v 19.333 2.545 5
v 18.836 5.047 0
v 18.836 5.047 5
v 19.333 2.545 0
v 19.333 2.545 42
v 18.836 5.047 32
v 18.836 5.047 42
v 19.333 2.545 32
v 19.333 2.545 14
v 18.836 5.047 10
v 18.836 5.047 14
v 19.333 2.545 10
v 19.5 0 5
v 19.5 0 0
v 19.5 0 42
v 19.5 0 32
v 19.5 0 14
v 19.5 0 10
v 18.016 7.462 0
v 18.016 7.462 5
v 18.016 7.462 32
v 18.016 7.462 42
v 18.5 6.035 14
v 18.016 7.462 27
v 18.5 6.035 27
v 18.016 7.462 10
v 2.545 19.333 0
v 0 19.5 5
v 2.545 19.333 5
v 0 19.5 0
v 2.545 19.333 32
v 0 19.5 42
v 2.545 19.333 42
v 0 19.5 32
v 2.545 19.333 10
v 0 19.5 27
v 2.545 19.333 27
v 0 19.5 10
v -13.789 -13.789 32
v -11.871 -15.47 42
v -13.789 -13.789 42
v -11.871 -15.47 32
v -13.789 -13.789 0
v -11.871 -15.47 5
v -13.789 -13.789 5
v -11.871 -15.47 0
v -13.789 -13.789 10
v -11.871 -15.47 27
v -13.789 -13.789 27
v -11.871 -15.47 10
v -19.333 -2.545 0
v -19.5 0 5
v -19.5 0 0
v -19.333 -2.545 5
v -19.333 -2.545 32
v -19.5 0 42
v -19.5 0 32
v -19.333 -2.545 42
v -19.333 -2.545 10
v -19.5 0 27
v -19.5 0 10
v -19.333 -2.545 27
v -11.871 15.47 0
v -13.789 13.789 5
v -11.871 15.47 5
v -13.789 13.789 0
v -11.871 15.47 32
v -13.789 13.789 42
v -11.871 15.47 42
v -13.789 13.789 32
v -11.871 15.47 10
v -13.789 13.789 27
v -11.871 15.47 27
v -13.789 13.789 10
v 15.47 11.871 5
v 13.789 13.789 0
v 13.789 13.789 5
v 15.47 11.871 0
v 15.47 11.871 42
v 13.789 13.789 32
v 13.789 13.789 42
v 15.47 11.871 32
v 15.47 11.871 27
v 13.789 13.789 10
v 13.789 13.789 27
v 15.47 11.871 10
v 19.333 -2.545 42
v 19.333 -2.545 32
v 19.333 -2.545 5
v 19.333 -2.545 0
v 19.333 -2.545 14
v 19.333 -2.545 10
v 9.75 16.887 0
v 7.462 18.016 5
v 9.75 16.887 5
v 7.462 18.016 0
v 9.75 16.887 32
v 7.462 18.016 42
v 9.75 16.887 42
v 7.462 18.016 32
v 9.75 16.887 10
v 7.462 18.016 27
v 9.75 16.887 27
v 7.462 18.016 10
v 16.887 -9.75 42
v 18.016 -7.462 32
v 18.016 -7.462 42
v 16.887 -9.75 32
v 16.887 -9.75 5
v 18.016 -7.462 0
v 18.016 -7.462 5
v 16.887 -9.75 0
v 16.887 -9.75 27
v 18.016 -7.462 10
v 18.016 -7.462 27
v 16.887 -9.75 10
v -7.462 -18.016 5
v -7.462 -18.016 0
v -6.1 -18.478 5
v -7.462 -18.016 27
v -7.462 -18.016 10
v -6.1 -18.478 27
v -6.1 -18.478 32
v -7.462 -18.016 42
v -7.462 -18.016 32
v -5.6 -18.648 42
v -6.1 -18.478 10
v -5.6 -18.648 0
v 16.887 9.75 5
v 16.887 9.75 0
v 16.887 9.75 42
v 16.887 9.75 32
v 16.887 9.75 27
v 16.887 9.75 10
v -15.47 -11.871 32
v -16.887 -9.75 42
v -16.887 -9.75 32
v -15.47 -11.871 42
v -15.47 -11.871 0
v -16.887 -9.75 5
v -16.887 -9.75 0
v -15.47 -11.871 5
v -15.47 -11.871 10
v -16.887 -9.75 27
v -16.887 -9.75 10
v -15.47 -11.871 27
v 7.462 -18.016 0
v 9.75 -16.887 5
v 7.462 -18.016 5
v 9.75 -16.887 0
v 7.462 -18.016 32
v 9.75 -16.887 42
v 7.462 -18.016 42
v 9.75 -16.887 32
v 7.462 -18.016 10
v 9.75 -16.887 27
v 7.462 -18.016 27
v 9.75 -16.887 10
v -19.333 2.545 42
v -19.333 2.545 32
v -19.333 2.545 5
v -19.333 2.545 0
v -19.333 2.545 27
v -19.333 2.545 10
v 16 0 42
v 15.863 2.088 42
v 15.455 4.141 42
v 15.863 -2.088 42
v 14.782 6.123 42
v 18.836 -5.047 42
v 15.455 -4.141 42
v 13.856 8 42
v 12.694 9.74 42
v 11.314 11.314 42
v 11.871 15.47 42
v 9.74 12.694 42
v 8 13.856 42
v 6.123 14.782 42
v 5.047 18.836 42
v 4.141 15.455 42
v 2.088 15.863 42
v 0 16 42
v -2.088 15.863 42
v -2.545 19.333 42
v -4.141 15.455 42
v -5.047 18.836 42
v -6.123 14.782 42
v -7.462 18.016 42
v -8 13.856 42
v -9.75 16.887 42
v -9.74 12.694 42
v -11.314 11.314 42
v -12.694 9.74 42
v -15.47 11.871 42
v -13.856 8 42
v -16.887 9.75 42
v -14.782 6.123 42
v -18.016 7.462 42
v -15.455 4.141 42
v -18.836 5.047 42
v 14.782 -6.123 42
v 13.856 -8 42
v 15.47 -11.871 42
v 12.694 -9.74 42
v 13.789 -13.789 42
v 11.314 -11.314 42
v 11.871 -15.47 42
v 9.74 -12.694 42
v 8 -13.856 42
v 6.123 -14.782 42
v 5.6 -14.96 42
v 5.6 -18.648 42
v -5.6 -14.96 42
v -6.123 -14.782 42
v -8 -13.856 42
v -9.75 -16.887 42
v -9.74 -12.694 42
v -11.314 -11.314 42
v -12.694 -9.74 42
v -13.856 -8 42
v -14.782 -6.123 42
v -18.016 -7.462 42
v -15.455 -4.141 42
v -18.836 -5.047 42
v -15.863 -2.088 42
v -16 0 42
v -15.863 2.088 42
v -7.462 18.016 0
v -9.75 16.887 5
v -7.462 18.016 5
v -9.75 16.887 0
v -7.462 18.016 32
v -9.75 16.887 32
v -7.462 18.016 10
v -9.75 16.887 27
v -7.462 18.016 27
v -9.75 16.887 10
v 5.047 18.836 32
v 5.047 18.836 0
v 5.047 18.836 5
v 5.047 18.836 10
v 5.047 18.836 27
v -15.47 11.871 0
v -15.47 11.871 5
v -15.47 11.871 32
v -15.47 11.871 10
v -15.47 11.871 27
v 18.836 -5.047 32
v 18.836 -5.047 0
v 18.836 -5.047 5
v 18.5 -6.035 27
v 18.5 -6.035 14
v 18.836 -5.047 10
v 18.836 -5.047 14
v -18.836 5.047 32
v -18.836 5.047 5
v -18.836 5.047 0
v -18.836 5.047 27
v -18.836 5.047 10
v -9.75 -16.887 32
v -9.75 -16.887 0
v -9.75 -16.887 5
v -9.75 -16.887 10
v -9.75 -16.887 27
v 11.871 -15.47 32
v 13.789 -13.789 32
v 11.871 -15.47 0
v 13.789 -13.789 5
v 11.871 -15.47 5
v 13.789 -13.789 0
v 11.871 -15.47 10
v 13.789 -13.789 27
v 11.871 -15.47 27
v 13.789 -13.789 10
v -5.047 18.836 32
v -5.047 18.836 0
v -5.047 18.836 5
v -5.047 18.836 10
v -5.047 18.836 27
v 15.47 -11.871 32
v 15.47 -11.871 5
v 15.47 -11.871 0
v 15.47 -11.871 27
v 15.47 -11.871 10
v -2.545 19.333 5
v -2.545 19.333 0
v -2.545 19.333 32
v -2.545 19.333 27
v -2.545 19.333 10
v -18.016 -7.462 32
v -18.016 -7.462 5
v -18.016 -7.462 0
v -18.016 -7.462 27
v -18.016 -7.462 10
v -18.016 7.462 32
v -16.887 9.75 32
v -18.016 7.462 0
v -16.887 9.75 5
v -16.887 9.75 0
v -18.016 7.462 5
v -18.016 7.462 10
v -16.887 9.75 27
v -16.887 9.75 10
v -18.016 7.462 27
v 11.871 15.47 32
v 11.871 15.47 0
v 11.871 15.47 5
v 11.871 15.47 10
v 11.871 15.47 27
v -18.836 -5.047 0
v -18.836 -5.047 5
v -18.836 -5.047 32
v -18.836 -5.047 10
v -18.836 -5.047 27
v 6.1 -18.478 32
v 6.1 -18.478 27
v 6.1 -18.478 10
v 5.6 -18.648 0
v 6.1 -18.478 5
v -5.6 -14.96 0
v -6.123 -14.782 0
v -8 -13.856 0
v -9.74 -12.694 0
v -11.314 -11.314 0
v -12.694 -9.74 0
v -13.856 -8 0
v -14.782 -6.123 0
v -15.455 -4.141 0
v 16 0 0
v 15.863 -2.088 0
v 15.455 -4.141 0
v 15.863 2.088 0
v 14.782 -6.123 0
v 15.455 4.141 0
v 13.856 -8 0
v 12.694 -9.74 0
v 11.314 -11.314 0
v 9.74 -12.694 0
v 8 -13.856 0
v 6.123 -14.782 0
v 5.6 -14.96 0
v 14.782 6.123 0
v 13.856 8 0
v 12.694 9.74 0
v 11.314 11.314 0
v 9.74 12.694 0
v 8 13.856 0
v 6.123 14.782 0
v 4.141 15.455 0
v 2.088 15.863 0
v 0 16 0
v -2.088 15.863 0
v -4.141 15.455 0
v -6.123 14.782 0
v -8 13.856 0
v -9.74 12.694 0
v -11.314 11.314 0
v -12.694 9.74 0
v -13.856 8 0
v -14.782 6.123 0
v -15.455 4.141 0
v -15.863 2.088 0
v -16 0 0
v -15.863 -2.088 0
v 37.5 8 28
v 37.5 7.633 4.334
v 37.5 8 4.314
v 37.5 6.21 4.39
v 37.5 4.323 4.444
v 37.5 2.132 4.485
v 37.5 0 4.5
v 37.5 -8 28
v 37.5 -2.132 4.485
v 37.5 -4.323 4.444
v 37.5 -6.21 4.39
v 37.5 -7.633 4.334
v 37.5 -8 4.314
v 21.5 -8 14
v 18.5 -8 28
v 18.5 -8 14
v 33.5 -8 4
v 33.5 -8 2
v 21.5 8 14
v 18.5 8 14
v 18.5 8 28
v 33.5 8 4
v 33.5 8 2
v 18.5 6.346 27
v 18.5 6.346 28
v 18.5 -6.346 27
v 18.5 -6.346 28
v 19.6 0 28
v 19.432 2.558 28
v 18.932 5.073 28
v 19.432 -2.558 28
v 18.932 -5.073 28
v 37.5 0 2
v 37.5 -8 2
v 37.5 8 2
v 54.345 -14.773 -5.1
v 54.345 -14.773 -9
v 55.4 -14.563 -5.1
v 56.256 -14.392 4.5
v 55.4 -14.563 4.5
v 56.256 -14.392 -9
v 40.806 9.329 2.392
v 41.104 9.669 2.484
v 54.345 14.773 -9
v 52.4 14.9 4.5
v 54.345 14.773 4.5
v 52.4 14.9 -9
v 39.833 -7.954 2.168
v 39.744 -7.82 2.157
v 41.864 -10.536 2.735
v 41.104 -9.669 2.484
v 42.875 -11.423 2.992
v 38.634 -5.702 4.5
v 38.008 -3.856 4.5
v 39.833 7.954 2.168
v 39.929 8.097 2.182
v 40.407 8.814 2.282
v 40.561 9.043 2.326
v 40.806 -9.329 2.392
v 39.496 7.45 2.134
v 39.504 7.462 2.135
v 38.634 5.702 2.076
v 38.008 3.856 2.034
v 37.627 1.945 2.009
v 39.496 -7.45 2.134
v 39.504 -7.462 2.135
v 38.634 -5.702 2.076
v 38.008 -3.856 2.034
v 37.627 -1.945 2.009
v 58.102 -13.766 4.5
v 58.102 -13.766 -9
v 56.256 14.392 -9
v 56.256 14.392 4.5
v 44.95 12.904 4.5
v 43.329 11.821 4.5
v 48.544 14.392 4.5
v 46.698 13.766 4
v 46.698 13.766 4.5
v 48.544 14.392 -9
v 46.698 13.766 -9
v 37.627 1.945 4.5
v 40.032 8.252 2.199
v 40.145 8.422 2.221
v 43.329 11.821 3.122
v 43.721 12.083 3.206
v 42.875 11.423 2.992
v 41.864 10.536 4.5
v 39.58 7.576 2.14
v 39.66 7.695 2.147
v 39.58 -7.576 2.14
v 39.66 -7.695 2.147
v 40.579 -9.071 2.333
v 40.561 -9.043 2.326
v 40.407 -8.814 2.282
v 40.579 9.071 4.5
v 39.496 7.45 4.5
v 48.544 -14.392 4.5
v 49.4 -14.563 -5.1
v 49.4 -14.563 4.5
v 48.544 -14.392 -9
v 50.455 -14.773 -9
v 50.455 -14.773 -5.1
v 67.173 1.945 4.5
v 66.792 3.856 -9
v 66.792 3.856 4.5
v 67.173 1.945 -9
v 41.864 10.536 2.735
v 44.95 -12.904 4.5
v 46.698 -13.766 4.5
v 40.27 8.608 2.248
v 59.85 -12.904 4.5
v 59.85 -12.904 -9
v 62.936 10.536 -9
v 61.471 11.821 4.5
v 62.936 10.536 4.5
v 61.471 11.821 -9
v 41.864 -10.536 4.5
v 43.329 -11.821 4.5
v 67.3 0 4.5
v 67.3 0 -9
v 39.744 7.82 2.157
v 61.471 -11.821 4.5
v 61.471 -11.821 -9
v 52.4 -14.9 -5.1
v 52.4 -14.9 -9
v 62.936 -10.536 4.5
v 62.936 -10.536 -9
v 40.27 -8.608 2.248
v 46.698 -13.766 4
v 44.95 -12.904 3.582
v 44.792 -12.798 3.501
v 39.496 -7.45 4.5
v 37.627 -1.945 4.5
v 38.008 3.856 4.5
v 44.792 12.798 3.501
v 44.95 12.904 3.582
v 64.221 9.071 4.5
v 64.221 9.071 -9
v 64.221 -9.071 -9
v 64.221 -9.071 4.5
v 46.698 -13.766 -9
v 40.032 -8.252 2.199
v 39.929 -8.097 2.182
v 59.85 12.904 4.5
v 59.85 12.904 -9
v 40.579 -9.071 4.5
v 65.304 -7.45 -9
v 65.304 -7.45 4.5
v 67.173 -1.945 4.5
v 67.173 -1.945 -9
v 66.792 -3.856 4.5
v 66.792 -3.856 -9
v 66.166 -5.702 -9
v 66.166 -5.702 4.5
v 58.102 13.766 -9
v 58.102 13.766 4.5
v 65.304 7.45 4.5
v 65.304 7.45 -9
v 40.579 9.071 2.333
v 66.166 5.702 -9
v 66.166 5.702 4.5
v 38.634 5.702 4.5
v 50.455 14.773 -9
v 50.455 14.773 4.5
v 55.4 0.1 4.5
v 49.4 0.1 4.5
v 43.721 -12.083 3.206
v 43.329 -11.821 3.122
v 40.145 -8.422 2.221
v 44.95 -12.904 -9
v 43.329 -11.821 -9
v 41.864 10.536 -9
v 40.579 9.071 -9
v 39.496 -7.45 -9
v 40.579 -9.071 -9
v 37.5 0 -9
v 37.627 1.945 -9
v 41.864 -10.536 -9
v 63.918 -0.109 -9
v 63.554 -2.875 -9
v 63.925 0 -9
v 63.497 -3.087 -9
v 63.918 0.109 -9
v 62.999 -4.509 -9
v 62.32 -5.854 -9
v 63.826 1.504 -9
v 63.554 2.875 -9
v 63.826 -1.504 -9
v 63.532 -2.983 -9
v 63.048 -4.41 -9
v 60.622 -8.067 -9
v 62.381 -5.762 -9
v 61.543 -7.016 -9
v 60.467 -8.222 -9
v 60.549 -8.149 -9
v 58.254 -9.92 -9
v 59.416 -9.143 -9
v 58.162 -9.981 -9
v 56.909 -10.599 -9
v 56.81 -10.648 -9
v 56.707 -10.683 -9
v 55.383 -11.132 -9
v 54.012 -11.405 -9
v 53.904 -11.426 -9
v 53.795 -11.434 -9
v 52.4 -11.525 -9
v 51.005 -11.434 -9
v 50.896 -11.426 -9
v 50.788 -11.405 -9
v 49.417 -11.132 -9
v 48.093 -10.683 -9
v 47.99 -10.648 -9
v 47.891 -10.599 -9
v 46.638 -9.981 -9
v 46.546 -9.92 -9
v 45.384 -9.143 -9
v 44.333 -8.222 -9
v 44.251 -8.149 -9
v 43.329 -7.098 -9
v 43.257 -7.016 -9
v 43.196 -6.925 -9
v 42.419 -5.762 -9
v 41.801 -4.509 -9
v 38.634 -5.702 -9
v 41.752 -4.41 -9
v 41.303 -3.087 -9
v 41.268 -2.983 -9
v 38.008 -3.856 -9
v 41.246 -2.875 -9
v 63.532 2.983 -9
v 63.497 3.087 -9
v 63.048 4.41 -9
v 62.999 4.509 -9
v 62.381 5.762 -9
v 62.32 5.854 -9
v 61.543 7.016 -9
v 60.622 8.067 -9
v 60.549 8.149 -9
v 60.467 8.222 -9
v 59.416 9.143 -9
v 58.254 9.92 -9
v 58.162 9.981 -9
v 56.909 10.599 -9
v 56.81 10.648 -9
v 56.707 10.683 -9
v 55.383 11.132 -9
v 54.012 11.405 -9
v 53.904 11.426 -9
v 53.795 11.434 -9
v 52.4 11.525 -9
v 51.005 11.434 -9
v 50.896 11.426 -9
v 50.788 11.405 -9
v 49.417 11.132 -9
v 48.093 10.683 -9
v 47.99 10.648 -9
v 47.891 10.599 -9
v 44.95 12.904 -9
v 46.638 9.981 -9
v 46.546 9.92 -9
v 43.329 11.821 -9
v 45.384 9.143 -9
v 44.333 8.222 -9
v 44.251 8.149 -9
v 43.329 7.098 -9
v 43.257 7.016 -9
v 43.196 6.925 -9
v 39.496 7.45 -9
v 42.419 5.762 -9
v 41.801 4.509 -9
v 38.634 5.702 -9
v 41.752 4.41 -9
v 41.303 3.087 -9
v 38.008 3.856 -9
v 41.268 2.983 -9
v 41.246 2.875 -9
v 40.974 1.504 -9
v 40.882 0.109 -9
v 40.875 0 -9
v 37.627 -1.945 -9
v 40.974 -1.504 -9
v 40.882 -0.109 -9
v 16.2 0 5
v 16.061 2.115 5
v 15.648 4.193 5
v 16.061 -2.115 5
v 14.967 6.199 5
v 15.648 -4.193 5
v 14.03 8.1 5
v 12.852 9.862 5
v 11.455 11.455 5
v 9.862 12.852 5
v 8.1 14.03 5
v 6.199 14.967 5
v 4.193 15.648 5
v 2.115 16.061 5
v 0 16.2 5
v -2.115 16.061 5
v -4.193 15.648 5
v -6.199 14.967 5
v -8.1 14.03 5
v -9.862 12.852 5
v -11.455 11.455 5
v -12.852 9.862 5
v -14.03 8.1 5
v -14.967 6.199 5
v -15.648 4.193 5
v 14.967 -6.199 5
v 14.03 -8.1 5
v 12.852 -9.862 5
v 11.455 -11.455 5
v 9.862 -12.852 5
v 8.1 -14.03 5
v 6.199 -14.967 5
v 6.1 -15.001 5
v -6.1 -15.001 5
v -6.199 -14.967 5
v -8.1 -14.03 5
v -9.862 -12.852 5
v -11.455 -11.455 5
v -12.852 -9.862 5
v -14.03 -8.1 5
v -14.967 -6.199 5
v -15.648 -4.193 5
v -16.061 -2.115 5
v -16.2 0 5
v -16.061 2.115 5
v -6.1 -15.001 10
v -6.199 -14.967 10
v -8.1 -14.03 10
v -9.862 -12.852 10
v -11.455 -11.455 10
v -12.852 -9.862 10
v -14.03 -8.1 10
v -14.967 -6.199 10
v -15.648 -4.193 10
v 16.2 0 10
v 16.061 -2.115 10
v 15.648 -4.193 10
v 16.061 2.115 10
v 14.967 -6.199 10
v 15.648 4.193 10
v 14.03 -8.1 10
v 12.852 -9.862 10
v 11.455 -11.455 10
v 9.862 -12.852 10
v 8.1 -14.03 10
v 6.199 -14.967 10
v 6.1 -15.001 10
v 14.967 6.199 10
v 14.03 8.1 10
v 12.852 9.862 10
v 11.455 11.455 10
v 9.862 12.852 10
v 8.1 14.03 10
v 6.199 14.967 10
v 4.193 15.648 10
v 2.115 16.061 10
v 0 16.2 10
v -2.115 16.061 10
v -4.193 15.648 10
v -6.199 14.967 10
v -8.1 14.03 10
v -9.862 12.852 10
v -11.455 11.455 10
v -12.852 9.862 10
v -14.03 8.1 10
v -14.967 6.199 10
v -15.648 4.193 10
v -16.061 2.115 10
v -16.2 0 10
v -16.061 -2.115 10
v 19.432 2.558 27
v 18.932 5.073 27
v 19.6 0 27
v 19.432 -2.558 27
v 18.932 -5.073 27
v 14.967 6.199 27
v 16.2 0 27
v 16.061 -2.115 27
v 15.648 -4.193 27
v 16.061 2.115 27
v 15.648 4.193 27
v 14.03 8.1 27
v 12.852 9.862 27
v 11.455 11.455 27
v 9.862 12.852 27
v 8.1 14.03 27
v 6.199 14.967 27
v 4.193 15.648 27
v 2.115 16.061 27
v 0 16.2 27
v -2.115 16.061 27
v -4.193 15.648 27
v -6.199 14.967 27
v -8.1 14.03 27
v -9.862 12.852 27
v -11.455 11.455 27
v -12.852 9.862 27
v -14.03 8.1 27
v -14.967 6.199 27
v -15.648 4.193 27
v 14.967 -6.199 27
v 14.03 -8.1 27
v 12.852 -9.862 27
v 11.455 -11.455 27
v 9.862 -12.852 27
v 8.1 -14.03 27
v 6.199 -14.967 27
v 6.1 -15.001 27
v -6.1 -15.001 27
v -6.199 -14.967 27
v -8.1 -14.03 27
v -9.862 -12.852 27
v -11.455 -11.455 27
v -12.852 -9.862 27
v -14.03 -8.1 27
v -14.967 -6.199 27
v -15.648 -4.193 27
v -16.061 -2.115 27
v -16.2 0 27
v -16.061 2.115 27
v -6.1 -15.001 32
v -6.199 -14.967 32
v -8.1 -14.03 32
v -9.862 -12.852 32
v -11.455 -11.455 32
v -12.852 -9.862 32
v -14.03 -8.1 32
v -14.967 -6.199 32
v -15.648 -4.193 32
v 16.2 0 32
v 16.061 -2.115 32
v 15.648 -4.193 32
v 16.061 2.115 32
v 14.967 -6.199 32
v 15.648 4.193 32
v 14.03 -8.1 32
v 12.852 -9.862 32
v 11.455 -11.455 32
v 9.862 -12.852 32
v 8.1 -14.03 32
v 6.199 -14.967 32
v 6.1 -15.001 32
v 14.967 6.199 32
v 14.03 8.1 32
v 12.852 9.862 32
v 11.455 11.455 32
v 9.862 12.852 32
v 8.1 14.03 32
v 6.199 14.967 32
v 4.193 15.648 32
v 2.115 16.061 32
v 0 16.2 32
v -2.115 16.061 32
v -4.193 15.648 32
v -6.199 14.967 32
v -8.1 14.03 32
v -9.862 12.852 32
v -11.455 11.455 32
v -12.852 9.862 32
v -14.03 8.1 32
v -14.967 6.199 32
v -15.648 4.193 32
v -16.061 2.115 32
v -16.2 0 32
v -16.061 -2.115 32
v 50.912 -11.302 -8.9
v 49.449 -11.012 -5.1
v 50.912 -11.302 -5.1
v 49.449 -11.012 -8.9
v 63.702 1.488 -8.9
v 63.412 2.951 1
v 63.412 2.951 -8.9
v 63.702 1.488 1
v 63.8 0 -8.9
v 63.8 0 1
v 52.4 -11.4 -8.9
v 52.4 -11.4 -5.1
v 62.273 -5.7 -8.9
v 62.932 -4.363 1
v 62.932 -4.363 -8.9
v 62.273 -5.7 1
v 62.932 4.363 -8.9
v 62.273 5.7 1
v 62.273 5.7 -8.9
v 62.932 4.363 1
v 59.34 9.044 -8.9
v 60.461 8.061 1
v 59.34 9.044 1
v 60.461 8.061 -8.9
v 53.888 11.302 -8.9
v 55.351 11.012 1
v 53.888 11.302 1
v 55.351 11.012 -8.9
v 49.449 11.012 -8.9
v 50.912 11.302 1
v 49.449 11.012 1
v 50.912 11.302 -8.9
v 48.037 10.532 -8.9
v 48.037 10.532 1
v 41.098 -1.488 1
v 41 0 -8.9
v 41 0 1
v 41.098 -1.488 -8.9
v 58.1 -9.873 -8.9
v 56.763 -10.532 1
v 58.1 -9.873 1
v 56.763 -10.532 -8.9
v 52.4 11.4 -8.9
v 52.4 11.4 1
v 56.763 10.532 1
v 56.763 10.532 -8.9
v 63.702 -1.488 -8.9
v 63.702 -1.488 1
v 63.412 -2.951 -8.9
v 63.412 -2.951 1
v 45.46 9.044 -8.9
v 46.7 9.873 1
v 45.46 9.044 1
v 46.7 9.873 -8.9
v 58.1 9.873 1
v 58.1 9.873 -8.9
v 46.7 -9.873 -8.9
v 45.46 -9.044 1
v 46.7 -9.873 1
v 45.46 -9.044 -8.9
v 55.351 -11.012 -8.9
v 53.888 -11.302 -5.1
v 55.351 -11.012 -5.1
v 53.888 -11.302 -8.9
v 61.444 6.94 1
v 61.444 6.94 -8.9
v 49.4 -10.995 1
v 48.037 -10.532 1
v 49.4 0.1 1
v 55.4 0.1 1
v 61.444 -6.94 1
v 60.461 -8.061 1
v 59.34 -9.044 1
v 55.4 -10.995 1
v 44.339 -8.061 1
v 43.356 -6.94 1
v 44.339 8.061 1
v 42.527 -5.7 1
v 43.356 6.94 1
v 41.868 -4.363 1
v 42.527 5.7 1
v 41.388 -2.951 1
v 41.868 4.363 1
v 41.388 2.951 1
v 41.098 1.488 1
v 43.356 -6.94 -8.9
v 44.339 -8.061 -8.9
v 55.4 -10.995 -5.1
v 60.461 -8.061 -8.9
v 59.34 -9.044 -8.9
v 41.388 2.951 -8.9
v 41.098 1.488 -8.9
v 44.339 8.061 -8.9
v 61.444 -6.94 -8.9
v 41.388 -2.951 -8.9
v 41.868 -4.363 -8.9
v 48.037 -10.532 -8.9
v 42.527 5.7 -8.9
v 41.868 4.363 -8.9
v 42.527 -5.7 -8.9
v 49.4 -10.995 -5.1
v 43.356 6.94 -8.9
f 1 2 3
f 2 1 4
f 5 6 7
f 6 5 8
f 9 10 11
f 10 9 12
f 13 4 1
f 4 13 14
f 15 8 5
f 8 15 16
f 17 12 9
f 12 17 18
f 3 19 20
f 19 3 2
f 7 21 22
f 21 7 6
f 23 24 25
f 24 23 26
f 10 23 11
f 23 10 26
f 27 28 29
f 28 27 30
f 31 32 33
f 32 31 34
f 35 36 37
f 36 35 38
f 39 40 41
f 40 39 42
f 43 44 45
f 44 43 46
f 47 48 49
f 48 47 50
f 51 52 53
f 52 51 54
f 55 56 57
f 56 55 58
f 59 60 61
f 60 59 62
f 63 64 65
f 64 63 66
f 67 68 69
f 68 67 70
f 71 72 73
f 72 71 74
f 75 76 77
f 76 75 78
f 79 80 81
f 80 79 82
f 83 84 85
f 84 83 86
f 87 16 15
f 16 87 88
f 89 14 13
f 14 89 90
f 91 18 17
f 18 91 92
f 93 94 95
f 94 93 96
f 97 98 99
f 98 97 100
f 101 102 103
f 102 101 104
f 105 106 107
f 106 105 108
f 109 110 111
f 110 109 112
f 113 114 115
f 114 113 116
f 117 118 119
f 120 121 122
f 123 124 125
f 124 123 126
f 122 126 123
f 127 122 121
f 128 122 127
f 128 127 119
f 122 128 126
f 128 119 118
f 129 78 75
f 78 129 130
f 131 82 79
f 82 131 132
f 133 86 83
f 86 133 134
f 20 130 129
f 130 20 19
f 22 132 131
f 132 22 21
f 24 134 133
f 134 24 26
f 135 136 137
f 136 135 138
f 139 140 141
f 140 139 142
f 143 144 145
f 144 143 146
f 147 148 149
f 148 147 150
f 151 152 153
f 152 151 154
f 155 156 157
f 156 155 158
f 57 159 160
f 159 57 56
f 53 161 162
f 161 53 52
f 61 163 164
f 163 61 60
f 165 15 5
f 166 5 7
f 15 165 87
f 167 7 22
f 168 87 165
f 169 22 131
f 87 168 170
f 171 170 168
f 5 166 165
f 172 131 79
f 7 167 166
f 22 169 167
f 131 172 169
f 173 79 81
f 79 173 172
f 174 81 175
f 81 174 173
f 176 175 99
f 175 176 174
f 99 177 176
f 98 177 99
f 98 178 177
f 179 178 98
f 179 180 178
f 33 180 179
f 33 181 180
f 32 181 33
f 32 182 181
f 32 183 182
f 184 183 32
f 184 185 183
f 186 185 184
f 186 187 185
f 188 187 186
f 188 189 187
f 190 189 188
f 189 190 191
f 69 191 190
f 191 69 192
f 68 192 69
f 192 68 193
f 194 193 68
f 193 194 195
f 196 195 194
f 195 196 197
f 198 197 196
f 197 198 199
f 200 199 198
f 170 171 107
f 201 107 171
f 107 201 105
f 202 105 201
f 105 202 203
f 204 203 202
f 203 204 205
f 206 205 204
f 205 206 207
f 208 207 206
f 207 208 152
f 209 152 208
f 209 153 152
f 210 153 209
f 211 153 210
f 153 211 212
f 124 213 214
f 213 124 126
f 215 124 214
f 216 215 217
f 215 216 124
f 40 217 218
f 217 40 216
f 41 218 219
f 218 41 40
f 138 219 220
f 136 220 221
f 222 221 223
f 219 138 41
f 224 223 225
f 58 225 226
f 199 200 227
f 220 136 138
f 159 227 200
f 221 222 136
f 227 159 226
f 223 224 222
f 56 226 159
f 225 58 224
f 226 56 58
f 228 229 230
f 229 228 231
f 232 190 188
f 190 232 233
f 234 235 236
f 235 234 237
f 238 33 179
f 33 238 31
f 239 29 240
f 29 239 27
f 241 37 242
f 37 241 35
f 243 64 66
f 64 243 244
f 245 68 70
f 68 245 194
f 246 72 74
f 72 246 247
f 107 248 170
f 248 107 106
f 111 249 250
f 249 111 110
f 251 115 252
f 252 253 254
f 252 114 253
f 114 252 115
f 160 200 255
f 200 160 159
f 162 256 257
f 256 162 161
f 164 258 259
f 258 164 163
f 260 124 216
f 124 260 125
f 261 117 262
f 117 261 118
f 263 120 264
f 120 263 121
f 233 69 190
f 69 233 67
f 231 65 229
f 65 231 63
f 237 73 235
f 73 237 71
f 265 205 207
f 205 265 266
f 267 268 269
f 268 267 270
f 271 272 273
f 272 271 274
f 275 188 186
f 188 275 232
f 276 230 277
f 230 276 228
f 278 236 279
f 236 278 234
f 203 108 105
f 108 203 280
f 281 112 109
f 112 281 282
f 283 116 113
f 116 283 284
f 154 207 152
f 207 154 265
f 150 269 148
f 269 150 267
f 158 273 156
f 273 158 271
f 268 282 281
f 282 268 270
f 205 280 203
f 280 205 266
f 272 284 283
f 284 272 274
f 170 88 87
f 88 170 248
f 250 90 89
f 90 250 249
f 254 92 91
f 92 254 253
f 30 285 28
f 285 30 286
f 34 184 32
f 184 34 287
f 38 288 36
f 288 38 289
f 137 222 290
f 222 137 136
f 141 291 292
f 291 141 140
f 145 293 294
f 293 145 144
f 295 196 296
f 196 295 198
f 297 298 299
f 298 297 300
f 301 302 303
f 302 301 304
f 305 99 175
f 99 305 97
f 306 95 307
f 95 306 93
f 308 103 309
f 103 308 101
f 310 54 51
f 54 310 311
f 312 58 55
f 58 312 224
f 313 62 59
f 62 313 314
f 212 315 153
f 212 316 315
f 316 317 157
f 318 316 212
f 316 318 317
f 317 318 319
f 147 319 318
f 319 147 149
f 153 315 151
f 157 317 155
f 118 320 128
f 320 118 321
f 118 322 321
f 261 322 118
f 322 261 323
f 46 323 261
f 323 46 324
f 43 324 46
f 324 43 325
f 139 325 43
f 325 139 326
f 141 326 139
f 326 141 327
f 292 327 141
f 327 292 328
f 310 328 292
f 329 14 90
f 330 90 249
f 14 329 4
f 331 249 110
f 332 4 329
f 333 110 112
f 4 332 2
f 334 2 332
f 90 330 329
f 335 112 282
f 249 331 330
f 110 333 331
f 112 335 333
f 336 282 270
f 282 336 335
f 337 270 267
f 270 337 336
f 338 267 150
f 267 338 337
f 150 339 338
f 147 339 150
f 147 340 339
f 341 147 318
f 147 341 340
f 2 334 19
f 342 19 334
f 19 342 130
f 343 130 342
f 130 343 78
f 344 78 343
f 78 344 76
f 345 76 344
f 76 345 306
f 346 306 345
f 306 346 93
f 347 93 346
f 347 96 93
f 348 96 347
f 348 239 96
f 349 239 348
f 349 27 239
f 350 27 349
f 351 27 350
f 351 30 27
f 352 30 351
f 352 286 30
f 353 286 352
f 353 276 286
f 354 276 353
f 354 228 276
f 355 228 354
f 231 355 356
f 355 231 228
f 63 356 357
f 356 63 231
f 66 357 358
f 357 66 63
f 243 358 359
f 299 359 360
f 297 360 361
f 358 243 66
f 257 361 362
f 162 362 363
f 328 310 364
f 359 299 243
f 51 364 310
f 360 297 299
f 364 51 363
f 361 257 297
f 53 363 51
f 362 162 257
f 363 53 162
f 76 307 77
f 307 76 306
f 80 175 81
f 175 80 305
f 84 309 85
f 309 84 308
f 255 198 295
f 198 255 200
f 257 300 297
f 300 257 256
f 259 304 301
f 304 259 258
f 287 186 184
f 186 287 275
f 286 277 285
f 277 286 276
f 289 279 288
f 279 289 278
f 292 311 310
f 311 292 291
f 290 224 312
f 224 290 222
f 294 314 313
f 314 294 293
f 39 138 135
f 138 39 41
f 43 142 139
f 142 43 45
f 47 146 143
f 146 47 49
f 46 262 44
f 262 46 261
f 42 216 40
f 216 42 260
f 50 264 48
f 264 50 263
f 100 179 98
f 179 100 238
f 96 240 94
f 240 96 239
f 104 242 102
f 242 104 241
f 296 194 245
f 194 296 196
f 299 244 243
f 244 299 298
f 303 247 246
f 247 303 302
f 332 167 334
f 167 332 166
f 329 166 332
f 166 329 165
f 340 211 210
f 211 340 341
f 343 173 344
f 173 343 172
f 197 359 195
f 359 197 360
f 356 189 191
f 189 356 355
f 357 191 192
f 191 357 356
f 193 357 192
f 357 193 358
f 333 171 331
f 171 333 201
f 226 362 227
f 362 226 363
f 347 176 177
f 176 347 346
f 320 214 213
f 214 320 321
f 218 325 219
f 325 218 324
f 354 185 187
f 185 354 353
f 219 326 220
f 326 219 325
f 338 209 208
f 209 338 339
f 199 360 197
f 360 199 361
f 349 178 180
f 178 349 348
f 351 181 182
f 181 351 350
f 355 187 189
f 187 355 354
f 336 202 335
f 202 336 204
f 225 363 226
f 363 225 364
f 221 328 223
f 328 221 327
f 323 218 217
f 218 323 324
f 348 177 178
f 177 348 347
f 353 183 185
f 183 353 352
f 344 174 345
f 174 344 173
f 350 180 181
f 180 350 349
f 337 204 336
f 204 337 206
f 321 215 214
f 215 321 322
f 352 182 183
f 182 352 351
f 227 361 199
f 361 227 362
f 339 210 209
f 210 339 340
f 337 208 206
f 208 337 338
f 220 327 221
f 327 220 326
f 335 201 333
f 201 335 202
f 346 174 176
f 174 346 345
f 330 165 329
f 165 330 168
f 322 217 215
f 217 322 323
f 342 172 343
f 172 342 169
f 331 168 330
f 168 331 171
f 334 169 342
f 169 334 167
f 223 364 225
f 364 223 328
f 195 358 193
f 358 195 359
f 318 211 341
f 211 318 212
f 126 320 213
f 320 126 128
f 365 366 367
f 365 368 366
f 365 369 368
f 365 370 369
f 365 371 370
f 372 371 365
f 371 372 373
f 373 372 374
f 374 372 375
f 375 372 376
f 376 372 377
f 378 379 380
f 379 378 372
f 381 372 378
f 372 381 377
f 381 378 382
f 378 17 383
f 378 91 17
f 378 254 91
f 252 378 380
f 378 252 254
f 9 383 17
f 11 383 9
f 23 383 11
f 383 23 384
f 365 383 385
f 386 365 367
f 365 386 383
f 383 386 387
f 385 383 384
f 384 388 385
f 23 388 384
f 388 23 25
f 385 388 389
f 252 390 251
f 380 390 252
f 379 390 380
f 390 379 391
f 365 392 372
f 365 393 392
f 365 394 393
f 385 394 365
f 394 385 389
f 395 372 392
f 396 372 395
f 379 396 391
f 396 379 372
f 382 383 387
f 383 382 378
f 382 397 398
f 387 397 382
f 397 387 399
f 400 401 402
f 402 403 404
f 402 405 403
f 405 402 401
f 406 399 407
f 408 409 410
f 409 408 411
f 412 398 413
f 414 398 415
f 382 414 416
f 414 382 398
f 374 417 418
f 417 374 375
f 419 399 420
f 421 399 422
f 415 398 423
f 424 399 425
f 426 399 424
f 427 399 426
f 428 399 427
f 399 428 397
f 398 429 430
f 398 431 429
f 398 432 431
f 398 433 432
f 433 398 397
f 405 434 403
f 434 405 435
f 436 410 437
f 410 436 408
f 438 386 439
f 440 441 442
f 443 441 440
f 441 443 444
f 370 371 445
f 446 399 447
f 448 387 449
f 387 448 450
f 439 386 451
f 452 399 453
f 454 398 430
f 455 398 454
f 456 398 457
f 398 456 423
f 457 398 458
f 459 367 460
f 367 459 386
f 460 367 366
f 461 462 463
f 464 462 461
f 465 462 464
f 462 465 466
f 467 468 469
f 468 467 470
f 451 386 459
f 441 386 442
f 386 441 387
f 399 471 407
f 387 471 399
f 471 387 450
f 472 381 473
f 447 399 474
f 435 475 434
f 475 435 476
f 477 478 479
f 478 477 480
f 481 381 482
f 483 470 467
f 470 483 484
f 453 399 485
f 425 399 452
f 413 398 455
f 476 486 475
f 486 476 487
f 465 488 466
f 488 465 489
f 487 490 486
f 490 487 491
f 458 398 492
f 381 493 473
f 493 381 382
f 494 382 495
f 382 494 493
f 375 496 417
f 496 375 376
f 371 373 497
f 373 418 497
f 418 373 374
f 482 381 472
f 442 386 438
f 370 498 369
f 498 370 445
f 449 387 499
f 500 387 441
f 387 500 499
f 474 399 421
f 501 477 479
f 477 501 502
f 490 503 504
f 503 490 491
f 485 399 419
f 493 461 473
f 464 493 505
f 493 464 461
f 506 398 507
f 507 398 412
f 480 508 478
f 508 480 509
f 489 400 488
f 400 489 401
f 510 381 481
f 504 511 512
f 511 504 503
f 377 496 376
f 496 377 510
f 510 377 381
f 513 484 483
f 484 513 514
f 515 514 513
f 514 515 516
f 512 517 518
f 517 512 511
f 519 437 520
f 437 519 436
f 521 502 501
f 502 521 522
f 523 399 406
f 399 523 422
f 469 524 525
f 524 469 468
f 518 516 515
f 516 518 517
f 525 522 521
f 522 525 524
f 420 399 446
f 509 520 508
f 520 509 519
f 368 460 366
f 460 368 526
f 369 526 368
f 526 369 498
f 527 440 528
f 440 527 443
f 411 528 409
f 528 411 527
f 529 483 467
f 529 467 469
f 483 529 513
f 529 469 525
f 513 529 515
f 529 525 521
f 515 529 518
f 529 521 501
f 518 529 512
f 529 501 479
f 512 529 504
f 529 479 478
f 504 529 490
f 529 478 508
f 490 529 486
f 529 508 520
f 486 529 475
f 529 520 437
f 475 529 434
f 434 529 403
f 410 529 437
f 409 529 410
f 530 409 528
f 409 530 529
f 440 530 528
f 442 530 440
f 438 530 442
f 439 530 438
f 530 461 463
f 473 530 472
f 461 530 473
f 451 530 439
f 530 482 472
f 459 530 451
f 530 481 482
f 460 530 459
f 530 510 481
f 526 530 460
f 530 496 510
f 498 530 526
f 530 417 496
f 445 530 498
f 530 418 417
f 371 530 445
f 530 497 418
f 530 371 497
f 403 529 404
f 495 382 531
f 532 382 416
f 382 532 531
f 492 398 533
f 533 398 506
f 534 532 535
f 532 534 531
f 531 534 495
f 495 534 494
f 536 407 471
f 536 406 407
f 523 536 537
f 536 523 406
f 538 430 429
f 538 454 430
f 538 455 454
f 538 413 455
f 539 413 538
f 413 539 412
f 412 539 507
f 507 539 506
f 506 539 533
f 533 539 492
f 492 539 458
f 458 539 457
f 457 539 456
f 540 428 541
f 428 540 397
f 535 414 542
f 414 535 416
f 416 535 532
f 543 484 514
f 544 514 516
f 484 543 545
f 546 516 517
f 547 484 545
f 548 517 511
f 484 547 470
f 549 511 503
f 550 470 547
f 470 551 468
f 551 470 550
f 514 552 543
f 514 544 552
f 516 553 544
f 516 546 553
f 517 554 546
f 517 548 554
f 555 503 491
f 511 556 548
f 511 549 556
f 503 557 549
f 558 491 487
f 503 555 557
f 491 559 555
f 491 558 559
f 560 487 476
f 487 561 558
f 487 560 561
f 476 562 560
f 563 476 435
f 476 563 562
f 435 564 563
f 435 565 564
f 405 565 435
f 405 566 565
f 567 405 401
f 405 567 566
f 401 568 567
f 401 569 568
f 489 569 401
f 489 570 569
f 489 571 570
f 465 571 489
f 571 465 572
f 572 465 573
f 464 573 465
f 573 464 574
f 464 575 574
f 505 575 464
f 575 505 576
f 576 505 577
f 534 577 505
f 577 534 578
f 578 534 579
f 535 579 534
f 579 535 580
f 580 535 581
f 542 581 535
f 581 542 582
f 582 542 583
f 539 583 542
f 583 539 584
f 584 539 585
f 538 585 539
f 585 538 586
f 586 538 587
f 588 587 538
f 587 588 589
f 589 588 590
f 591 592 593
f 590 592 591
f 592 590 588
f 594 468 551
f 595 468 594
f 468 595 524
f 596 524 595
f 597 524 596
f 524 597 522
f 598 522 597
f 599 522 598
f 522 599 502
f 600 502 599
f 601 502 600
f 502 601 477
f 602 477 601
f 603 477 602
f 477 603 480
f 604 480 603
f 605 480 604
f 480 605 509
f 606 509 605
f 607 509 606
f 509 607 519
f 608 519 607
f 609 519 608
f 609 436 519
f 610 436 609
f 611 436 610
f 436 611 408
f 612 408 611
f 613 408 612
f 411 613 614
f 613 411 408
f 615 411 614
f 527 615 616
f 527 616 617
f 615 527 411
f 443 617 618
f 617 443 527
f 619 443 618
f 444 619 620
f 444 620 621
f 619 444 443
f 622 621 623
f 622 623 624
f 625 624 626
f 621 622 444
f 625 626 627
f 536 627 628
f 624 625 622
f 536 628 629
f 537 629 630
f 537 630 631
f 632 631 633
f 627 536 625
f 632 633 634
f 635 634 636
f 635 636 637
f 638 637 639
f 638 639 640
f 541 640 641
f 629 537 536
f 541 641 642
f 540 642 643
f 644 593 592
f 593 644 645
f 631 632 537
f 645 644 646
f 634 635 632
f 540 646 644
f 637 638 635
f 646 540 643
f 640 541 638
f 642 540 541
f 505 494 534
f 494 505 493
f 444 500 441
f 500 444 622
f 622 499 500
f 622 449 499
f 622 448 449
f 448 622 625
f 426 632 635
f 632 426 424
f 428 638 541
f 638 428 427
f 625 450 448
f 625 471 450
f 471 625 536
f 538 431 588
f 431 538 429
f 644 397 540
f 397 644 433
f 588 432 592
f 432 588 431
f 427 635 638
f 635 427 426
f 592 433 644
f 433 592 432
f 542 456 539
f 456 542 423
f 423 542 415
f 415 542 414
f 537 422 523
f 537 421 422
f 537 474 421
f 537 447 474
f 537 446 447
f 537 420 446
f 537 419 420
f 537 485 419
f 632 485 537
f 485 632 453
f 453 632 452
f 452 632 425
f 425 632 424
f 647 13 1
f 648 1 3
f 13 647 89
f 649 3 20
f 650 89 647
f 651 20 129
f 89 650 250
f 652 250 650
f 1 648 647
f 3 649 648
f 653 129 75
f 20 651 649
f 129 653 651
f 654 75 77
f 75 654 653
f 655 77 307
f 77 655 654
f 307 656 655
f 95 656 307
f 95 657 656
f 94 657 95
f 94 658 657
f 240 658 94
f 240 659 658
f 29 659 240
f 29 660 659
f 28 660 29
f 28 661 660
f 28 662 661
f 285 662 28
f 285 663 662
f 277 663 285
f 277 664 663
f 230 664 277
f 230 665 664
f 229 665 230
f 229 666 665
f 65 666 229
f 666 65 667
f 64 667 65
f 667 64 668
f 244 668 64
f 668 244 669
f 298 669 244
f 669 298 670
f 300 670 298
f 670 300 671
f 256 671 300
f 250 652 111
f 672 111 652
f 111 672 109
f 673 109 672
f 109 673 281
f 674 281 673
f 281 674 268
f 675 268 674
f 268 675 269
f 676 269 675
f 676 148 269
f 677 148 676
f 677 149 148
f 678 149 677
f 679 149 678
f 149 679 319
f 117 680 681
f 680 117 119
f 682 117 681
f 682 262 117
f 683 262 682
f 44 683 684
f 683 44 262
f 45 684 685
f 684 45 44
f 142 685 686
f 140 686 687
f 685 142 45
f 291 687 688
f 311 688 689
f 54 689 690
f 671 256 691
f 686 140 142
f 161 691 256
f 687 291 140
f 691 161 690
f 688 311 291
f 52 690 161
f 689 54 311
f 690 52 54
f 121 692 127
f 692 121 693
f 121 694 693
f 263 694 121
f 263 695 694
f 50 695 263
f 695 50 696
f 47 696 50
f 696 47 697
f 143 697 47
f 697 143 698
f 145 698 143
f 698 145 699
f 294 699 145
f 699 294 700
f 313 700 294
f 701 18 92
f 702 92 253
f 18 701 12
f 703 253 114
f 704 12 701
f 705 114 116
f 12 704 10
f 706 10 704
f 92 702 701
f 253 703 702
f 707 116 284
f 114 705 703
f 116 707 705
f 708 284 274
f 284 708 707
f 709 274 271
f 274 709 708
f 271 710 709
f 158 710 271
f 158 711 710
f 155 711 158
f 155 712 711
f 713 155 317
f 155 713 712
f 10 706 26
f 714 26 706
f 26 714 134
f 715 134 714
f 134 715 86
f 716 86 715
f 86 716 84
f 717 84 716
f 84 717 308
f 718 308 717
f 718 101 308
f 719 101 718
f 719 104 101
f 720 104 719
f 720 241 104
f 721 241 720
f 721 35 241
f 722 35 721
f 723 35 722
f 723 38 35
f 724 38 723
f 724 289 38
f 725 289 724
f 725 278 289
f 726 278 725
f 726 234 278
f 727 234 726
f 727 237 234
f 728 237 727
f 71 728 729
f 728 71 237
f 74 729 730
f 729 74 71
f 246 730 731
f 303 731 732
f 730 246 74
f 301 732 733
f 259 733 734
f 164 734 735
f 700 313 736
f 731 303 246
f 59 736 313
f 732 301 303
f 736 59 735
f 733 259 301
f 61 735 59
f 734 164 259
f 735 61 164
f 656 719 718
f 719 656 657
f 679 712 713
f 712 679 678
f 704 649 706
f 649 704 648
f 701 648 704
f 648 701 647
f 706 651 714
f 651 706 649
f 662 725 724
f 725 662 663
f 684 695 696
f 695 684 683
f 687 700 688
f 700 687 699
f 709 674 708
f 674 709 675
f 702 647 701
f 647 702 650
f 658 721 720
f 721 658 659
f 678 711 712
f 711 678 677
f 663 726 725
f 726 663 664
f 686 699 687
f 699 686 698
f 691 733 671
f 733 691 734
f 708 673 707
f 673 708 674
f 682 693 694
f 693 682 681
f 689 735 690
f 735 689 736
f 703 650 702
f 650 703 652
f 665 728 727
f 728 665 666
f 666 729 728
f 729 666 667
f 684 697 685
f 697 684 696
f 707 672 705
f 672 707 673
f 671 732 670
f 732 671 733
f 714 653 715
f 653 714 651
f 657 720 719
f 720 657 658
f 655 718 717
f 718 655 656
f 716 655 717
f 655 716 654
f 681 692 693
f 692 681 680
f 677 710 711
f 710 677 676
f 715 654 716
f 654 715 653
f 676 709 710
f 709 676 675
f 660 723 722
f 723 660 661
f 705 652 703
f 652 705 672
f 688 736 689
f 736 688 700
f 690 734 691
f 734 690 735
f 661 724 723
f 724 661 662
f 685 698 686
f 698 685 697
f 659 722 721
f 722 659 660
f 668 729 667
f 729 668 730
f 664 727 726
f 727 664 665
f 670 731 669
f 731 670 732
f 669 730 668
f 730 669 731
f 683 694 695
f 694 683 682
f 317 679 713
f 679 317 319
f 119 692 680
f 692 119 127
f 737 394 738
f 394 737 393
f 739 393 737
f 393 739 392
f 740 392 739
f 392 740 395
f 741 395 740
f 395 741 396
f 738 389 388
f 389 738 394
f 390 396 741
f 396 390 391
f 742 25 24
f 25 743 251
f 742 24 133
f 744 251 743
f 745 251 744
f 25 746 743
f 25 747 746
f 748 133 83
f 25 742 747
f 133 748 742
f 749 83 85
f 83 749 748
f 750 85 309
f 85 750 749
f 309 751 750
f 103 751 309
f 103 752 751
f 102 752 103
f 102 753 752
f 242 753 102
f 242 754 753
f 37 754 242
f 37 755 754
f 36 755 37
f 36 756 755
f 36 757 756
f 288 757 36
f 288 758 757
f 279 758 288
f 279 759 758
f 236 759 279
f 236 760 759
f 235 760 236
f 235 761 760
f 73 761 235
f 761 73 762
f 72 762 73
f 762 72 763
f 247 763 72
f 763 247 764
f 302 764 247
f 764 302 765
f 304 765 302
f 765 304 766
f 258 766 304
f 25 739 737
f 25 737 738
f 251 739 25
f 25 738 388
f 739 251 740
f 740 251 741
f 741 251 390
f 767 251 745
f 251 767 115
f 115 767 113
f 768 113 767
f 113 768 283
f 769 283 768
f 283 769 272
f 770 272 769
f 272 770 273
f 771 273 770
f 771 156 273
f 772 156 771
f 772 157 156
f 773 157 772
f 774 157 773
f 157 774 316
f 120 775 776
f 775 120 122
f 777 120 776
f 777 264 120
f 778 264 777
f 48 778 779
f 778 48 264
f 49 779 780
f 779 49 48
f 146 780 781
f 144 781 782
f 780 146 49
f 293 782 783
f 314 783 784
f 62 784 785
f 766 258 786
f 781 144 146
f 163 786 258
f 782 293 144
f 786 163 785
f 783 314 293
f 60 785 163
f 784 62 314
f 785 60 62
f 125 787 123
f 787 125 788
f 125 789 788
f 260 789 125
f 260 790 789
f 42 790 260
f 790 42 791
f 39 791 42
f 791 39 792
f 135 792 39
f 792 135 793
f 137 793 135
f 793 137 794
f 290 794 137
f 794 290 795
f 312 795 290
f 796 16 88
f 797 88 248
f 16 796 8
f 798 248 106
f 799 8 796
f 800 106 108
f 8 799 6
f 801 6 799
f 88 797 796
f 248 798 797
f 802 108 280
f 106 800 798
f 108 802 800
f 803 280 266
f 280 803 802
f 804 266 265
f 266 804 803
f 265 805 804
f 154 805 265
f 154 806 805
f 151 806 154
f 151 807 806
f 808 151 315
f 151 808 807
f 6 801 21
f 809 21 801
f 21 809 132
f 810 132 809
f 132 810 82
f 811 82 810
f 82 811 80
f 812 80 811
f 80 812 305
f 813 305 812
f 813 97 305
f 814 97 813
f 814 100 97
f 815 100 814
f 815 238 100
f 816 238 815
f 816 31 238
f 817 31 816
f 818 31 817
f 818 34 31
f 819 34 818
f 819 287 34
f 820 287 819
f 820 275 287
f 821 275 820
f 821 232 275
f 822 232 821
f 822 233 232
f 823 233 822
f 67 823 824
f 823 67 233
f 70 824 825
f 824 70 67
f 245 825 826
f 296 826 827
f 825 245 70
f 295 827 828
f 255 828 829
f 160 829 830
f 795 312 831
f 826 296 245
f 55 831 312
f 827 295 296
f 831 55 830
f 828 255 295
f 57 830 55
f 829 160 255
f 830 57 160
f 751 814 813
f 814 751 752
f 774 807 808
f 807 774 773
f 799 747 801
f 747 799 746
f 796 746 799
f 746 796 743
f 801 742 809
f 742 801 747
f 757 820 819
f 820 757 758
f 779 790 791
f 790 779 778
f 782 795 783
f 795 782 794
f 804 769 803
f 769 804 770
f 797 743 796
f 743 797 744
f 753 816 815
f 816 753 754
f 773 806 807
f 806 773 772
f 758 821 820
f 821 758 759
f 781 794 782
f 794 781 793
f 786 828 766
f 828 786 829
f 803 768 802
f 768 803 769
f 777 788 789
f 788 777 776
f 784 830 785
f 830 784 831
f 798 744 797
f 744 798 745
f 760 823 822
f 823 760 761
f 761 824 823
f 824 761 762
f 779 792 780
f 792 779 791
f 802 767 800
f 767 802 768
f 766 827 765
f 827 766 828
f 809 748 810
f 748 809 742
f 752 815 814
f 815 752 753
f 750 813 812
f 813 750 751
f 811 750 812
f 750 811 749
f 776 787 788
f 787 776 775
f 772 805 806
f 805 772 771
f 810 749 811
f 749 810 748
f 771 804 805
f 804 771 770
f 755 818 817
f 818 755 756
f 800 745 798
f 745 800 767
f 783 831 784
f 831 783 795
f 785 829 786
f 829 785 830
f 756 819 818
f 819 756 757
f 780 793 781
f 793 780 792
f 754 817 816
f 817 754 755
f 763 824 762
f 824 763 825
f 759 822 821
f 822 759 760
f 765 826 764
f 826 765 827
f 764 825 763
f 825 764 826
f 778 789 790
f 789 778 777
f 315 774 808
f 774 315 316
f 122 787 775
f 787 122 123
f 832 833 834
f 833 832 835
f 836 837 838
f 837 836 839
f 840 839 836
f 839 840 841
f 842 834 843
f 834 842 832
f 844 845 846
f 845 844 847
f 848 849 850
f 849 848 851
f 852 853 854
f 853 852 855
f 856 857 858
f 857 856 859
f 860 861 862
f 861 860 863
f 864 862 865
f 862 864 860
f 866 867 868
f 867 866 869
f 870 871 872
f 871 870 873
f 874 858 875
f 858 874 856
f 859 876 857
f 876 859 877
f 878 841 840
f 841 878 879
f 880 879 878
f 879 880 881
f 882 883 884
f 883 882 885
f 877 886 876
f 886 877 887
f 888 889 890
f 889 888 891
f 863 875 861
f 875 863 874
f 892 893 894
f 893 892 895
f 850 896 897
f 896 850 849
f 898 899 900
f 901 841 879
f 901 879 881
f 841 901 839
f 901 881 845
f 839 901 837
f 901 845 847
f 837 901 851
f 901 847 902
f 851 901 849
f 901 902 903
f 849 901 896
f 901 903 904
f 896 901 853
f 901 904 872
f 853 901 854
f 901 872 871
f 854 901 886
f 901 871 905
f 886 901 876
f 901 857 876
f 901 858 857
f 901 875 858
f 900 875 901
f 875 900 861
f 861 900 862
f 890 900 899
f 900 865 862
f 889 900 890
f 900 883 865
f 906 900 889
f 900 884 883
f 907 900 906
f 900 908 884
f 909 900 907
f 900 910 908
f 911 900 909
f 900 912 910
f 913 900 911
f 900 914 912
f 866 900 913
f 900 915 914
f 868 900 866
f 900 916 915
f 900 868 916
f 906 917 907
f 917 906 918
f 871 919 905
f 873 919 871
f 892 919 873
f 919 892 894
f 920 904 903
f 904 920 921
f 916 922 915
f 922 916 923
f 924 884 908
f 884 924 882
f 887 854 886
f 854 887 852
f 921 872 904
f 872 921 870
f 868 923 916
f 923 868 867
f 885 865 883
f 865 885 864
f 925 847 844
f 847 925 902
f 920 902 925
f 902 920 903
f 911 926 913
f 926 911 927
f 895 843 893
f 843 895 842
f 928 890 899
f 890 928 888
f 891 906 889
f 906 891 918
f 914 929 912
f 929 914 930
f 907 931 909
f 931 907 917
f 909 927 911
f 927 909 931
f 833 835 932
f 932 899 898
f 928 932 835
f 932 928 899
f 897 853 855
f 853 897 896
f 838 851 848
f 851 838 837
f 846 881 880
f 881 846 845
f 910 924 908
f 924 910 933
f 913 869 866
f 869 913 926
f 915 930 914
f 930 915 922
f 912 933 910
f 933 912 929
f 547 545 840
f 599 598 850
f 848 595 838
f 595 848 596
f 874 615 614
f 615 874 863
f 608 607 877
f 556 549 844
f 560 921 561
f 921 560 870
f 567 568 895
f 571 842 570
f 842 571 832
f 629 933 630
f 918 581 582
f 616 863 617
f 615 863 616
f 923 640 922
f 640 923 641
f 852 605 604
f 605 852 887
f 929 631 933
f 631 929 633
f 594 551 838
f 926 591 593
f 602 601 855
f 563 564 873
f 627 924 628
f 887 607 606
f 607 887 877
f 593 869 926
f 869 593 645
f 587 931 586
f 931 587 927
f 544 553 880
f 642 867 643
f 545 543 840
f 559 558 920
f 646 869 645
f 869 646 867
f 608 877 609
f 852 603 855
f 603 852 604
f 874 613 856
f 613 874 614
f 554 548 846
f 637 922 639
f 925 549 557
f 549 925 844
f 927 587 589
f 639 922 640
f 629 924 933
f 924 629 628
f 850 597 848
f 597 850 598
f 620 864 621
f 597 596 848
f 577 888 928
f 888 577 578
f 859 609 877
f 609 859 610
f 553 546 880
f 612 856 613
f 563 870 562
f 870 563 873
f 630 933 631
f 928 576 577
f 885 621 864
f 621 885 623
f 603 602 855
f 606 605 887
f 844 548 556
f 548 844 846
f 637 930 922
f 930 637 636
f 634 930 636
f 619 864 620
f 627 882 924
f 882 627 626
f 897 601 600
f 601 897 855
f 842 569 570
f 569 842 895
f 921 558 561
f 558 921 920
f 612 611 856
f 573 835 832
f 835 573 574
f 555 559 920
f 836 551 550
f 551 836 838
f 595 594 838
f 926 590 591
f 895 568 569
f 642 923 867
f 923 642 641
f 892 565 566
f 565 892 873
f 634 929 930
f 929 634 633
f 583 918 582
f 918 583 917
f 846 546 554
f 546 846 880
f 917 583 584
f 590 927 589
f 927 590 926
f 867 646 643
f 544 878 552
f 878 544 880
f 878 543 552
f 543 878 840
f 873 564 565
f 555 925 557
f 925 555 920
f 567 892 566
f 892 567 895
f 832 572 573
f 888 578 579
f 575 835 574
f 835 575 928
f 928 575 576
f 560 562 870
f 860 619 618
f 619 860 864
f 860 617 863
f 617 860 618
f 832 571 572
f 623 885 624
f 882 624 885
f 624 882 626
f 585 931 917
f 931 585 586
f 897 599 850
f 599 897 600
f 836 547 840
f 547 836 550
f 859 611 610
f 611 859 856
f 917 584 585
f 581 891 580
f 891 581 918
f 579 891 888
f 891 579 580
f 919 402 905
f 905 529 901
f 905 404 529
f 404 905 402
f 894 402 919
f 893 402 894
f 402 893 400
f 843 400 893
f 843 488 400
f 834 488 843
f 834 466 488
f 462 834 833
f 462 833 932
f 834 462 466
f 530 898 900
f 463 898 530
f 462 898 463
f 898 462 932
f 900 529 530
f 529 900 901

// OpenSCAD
// ╔══════════════════════════════════════════════════════════╗
// ║  JSN-SR04T Sensorhalterung                              ║
// ║  Vertikales Rohr DN25 · Sensor zeigt nach unten        ║
// ║  Tobias Meier · admin@secutobs.com · v0.2.0            ║
// ╠══════════════════════════════════════════════════════════╣
// ║  DRUCKEN:                                              ║
// ║  1. F6 → rendern  2. File → Export → STL              ║
// ║  Material:  PETG oder PLA                              ║
// ║  Schichthöhe: 0.2mm | Wandlinien: 4 | Infill: 40%    ║
// ║  Support: JA – von Bett                                ║
// ║  Ausrichtung: Klammer steht senkrecht auf dem Bett     ║
// ╚══════════════════════════════════════════════════════════╝

// ── Rohr-Durchmesser anpassen ────────────────────────────
ROHR_D = 32;   // DN25 = 32mm Außendurchmesser
               // DN20 = 25mm | DN32 = 40mm | DN40 = 50mm

// ── Sensor JSN-SR04T ─────────────────────────────────────
SENS_D  = 22.0;   // Sensorkopf Außendurchmesser
SENS_SP =  0.4;   // Pressfit-Spiel
SENS_T  = 13.0;   // Einbautiefe

// ── Kabelbinder ──────────────────────────────────────────
KB_B    =  5.0;   // Breite Kabelbinder-Schlitz
KB_ABST = 22.0;   // Abstand der zwei Schlitze
WAND_C  =  3.5;   // Wandstärke Klammer

// ── Berechnung ───────────────────────────────────────────
ROHR_R  = ROHR_D / 2;
CLIP_RA = ROHR_R + WAND_C;           // Klammer Außenradius
CLIP_H  = KB_ABST + KB_B*2 + 10;    // Klammerhöhe gesamt
SENS_R  = SENS_D/2 + SENS_SP;        // Sensoraufnahme Innenradius
AUFN_RA = SENS_R + 3.5;              // Sensoraufnahme Außenradius

// Arm-Geometrie
ARM_B   = 16;    // Arm-Querschnitt Breite
ARM_H   = 14;    // Arm-Querschnitt Höhe
// Arm startet mittig an der Klammer
ARM_Z   = (CLIP_H - ARM_H) / 2;
// Sensor hängt unter dem Arm
SENS_Z  = ARM_Z - SENS_T - 10;
// X-Abstand Rohrmitte → Sensormitte
OFFS_X  = CLIP_RA + ARM_B + AUFN_RA + 2;

$fn = 48;

// ════════════════════════════════════════════════════════
//  ALLES IN EINEM union() – verhindert lose Teile!
// ════════════════════════════════════════════════════════
difference() {
    union() {

        // ── 1. ROHRKLAMMER ───────────────────────────────
        // C-förmiger Ring um das Rohr
        difference() {
            cylinder(h=CLIP_H, r=CLIP_RA);
            // Rohrbohrung
            translate([0,0,-0.1])
                cylinder(h=CLIP_H+0.2, r=ROHR_R);
            // C-Öffnung nach hinten (neg. Y)
            OE = ROHR_R * 0.7;
            translate([-OE/2, -CLIP_RA-0.1, -0.1])
                cube([OE, CLIP_RA+0.2, CLIP_H+0.2]);
        }

        // ── 2. HORIZONTALER ARM ──────────────────────────
        // Verbindet Klammer mit Sensoraufnahme
        // Direkt mit hull() an Klammer angebunden → KEINE losen Teile
        hull() {
            // An der Klammer-Außenwand
            translate([CLIP_RA-1, -ARM_B/2, ARM_Z])
                cube([1, ARM_B, ARM_H]);
            // An der Sensorseite
            translate([OFFS_X-AUFN_RA-ARM_B, -ARM_B/2, ARM_Z])
                cube([ARM_B, ARM_B, ARM_H]);
        }

        // ── 3. VERTIKALER STEG ───────────────────────────
        // Führt Sensoraufnahme nach unten
        // hull() verbindet Arm und Sensoraufnahme → EIN Teil
        hull() {
            // Oben: Ende des Horizontalarms
            translate([OFFS_X-AUFN_RA-ARM_B, -ARM_B/2, ARM_Z])
                cube([ARM_B, ARM_B, ARM_H]);
            // Unten: über der Sensoraufnahme
            translate([OFFS_X-AUFN_RA-4, -ARM_B/2, SENS_Z+SENS_T-2])
                cube([4, ARM_B, 2]);
        }

        // ── 4. SENSORAUFNAHME ────────────────────────────
        // Zylindrische Aufnahme für Sensor (Pressfit von unten)
        // Mit hull() an Steg angebunden → EIN Teil
        hull() {
            // Verbindung zum Steg
            translate([OFFS_X-AUFN_RA-4, -ARM_B/2, SENS_Z+SENS_T-2])
                cube([4, ARM_B, 2]);
            // Aufnahmezylinder oben
            translate([OFFS_X, 0, SENS_Z+SENS_T])
                cylinder(h=0.5, r=AUFN_RA);
        }
        // Eigentlicher Aufnahmezylinder
        translate([OFFS_X, 0, SENS_Z])
            cylinder(h=SENS_T, r=AUFN_RA);

        // ── 5. VERSTEIFUNGSRIPPE ─────────────────────────
        // Dreieck-Rippe unter dem Arm für Stabilität
        hull() {
            translate([CLIP_RA-0.5, -2, ARM_Z])
                cube([1, 4, 3]);
            translate([OFFS_X-AUFN_RA-ARM_B-1, -2, ARM_Z+ARM_H*0.6])
                cube([1, 4, 3]);
        }

    } // end union()

    // ── BOHRUNGEN (außerhalb union, schneidet alles) ─────

    // Sensor-Bohrung von unten (Pressfit)
    translate([OFFS_X, 0, SENS_Z-0.1])
        cylinder(h=SENS_T-3+0.1, r=SENS_R);

    // Einführphase unten (erleichtert Einsetzen)
    translate([OFFS_X, 0, SENS_Z-1.5])
        cylinder(h=1.6, r1=SENS_R+2.0, r2=SENS_R);

    // Kabel-Nut seitlich (Kabel nach oben führen)
    translate([OFFS_X-3, -AUFN_RA-0.1, SENS_Z+SENS_T*0.3])
        cube([6, AUFN_RA+0.2, SENS_T*0.8]);

    // Kabelbinder-Schlitz 1 (unterer)
    translate([0, 0, 5])
        kb_schlitz_bohrung(CLIP_RA, KB_B);

    // Kabelbinder-Schlitz 2 (oberer)
    translate([0, 0, 5+KB_ABST])
        kb_schlitz_bohrung(CLIP_RA, KB_B);

} // end difference()


// ── Kabelbinder-Schlitz als Modul ────────────────────────
module kb_schlitz_bohrung(r, breite) {
    difference() {
        cylinder(h=breite, r=r+0.1);
        translate([0, 0, -0.1])
            cylinder(h=breite+0.2, r=r-WAND_C+0.2);
        // C-Öffnung nach hinten freilassen
        OE = ROHR_R * 0.7 + 1;
        translate([-OE/2, -r-0.2, -0.2])
            cube([OE, r+0.4, breite+0.4]);
    }
}
